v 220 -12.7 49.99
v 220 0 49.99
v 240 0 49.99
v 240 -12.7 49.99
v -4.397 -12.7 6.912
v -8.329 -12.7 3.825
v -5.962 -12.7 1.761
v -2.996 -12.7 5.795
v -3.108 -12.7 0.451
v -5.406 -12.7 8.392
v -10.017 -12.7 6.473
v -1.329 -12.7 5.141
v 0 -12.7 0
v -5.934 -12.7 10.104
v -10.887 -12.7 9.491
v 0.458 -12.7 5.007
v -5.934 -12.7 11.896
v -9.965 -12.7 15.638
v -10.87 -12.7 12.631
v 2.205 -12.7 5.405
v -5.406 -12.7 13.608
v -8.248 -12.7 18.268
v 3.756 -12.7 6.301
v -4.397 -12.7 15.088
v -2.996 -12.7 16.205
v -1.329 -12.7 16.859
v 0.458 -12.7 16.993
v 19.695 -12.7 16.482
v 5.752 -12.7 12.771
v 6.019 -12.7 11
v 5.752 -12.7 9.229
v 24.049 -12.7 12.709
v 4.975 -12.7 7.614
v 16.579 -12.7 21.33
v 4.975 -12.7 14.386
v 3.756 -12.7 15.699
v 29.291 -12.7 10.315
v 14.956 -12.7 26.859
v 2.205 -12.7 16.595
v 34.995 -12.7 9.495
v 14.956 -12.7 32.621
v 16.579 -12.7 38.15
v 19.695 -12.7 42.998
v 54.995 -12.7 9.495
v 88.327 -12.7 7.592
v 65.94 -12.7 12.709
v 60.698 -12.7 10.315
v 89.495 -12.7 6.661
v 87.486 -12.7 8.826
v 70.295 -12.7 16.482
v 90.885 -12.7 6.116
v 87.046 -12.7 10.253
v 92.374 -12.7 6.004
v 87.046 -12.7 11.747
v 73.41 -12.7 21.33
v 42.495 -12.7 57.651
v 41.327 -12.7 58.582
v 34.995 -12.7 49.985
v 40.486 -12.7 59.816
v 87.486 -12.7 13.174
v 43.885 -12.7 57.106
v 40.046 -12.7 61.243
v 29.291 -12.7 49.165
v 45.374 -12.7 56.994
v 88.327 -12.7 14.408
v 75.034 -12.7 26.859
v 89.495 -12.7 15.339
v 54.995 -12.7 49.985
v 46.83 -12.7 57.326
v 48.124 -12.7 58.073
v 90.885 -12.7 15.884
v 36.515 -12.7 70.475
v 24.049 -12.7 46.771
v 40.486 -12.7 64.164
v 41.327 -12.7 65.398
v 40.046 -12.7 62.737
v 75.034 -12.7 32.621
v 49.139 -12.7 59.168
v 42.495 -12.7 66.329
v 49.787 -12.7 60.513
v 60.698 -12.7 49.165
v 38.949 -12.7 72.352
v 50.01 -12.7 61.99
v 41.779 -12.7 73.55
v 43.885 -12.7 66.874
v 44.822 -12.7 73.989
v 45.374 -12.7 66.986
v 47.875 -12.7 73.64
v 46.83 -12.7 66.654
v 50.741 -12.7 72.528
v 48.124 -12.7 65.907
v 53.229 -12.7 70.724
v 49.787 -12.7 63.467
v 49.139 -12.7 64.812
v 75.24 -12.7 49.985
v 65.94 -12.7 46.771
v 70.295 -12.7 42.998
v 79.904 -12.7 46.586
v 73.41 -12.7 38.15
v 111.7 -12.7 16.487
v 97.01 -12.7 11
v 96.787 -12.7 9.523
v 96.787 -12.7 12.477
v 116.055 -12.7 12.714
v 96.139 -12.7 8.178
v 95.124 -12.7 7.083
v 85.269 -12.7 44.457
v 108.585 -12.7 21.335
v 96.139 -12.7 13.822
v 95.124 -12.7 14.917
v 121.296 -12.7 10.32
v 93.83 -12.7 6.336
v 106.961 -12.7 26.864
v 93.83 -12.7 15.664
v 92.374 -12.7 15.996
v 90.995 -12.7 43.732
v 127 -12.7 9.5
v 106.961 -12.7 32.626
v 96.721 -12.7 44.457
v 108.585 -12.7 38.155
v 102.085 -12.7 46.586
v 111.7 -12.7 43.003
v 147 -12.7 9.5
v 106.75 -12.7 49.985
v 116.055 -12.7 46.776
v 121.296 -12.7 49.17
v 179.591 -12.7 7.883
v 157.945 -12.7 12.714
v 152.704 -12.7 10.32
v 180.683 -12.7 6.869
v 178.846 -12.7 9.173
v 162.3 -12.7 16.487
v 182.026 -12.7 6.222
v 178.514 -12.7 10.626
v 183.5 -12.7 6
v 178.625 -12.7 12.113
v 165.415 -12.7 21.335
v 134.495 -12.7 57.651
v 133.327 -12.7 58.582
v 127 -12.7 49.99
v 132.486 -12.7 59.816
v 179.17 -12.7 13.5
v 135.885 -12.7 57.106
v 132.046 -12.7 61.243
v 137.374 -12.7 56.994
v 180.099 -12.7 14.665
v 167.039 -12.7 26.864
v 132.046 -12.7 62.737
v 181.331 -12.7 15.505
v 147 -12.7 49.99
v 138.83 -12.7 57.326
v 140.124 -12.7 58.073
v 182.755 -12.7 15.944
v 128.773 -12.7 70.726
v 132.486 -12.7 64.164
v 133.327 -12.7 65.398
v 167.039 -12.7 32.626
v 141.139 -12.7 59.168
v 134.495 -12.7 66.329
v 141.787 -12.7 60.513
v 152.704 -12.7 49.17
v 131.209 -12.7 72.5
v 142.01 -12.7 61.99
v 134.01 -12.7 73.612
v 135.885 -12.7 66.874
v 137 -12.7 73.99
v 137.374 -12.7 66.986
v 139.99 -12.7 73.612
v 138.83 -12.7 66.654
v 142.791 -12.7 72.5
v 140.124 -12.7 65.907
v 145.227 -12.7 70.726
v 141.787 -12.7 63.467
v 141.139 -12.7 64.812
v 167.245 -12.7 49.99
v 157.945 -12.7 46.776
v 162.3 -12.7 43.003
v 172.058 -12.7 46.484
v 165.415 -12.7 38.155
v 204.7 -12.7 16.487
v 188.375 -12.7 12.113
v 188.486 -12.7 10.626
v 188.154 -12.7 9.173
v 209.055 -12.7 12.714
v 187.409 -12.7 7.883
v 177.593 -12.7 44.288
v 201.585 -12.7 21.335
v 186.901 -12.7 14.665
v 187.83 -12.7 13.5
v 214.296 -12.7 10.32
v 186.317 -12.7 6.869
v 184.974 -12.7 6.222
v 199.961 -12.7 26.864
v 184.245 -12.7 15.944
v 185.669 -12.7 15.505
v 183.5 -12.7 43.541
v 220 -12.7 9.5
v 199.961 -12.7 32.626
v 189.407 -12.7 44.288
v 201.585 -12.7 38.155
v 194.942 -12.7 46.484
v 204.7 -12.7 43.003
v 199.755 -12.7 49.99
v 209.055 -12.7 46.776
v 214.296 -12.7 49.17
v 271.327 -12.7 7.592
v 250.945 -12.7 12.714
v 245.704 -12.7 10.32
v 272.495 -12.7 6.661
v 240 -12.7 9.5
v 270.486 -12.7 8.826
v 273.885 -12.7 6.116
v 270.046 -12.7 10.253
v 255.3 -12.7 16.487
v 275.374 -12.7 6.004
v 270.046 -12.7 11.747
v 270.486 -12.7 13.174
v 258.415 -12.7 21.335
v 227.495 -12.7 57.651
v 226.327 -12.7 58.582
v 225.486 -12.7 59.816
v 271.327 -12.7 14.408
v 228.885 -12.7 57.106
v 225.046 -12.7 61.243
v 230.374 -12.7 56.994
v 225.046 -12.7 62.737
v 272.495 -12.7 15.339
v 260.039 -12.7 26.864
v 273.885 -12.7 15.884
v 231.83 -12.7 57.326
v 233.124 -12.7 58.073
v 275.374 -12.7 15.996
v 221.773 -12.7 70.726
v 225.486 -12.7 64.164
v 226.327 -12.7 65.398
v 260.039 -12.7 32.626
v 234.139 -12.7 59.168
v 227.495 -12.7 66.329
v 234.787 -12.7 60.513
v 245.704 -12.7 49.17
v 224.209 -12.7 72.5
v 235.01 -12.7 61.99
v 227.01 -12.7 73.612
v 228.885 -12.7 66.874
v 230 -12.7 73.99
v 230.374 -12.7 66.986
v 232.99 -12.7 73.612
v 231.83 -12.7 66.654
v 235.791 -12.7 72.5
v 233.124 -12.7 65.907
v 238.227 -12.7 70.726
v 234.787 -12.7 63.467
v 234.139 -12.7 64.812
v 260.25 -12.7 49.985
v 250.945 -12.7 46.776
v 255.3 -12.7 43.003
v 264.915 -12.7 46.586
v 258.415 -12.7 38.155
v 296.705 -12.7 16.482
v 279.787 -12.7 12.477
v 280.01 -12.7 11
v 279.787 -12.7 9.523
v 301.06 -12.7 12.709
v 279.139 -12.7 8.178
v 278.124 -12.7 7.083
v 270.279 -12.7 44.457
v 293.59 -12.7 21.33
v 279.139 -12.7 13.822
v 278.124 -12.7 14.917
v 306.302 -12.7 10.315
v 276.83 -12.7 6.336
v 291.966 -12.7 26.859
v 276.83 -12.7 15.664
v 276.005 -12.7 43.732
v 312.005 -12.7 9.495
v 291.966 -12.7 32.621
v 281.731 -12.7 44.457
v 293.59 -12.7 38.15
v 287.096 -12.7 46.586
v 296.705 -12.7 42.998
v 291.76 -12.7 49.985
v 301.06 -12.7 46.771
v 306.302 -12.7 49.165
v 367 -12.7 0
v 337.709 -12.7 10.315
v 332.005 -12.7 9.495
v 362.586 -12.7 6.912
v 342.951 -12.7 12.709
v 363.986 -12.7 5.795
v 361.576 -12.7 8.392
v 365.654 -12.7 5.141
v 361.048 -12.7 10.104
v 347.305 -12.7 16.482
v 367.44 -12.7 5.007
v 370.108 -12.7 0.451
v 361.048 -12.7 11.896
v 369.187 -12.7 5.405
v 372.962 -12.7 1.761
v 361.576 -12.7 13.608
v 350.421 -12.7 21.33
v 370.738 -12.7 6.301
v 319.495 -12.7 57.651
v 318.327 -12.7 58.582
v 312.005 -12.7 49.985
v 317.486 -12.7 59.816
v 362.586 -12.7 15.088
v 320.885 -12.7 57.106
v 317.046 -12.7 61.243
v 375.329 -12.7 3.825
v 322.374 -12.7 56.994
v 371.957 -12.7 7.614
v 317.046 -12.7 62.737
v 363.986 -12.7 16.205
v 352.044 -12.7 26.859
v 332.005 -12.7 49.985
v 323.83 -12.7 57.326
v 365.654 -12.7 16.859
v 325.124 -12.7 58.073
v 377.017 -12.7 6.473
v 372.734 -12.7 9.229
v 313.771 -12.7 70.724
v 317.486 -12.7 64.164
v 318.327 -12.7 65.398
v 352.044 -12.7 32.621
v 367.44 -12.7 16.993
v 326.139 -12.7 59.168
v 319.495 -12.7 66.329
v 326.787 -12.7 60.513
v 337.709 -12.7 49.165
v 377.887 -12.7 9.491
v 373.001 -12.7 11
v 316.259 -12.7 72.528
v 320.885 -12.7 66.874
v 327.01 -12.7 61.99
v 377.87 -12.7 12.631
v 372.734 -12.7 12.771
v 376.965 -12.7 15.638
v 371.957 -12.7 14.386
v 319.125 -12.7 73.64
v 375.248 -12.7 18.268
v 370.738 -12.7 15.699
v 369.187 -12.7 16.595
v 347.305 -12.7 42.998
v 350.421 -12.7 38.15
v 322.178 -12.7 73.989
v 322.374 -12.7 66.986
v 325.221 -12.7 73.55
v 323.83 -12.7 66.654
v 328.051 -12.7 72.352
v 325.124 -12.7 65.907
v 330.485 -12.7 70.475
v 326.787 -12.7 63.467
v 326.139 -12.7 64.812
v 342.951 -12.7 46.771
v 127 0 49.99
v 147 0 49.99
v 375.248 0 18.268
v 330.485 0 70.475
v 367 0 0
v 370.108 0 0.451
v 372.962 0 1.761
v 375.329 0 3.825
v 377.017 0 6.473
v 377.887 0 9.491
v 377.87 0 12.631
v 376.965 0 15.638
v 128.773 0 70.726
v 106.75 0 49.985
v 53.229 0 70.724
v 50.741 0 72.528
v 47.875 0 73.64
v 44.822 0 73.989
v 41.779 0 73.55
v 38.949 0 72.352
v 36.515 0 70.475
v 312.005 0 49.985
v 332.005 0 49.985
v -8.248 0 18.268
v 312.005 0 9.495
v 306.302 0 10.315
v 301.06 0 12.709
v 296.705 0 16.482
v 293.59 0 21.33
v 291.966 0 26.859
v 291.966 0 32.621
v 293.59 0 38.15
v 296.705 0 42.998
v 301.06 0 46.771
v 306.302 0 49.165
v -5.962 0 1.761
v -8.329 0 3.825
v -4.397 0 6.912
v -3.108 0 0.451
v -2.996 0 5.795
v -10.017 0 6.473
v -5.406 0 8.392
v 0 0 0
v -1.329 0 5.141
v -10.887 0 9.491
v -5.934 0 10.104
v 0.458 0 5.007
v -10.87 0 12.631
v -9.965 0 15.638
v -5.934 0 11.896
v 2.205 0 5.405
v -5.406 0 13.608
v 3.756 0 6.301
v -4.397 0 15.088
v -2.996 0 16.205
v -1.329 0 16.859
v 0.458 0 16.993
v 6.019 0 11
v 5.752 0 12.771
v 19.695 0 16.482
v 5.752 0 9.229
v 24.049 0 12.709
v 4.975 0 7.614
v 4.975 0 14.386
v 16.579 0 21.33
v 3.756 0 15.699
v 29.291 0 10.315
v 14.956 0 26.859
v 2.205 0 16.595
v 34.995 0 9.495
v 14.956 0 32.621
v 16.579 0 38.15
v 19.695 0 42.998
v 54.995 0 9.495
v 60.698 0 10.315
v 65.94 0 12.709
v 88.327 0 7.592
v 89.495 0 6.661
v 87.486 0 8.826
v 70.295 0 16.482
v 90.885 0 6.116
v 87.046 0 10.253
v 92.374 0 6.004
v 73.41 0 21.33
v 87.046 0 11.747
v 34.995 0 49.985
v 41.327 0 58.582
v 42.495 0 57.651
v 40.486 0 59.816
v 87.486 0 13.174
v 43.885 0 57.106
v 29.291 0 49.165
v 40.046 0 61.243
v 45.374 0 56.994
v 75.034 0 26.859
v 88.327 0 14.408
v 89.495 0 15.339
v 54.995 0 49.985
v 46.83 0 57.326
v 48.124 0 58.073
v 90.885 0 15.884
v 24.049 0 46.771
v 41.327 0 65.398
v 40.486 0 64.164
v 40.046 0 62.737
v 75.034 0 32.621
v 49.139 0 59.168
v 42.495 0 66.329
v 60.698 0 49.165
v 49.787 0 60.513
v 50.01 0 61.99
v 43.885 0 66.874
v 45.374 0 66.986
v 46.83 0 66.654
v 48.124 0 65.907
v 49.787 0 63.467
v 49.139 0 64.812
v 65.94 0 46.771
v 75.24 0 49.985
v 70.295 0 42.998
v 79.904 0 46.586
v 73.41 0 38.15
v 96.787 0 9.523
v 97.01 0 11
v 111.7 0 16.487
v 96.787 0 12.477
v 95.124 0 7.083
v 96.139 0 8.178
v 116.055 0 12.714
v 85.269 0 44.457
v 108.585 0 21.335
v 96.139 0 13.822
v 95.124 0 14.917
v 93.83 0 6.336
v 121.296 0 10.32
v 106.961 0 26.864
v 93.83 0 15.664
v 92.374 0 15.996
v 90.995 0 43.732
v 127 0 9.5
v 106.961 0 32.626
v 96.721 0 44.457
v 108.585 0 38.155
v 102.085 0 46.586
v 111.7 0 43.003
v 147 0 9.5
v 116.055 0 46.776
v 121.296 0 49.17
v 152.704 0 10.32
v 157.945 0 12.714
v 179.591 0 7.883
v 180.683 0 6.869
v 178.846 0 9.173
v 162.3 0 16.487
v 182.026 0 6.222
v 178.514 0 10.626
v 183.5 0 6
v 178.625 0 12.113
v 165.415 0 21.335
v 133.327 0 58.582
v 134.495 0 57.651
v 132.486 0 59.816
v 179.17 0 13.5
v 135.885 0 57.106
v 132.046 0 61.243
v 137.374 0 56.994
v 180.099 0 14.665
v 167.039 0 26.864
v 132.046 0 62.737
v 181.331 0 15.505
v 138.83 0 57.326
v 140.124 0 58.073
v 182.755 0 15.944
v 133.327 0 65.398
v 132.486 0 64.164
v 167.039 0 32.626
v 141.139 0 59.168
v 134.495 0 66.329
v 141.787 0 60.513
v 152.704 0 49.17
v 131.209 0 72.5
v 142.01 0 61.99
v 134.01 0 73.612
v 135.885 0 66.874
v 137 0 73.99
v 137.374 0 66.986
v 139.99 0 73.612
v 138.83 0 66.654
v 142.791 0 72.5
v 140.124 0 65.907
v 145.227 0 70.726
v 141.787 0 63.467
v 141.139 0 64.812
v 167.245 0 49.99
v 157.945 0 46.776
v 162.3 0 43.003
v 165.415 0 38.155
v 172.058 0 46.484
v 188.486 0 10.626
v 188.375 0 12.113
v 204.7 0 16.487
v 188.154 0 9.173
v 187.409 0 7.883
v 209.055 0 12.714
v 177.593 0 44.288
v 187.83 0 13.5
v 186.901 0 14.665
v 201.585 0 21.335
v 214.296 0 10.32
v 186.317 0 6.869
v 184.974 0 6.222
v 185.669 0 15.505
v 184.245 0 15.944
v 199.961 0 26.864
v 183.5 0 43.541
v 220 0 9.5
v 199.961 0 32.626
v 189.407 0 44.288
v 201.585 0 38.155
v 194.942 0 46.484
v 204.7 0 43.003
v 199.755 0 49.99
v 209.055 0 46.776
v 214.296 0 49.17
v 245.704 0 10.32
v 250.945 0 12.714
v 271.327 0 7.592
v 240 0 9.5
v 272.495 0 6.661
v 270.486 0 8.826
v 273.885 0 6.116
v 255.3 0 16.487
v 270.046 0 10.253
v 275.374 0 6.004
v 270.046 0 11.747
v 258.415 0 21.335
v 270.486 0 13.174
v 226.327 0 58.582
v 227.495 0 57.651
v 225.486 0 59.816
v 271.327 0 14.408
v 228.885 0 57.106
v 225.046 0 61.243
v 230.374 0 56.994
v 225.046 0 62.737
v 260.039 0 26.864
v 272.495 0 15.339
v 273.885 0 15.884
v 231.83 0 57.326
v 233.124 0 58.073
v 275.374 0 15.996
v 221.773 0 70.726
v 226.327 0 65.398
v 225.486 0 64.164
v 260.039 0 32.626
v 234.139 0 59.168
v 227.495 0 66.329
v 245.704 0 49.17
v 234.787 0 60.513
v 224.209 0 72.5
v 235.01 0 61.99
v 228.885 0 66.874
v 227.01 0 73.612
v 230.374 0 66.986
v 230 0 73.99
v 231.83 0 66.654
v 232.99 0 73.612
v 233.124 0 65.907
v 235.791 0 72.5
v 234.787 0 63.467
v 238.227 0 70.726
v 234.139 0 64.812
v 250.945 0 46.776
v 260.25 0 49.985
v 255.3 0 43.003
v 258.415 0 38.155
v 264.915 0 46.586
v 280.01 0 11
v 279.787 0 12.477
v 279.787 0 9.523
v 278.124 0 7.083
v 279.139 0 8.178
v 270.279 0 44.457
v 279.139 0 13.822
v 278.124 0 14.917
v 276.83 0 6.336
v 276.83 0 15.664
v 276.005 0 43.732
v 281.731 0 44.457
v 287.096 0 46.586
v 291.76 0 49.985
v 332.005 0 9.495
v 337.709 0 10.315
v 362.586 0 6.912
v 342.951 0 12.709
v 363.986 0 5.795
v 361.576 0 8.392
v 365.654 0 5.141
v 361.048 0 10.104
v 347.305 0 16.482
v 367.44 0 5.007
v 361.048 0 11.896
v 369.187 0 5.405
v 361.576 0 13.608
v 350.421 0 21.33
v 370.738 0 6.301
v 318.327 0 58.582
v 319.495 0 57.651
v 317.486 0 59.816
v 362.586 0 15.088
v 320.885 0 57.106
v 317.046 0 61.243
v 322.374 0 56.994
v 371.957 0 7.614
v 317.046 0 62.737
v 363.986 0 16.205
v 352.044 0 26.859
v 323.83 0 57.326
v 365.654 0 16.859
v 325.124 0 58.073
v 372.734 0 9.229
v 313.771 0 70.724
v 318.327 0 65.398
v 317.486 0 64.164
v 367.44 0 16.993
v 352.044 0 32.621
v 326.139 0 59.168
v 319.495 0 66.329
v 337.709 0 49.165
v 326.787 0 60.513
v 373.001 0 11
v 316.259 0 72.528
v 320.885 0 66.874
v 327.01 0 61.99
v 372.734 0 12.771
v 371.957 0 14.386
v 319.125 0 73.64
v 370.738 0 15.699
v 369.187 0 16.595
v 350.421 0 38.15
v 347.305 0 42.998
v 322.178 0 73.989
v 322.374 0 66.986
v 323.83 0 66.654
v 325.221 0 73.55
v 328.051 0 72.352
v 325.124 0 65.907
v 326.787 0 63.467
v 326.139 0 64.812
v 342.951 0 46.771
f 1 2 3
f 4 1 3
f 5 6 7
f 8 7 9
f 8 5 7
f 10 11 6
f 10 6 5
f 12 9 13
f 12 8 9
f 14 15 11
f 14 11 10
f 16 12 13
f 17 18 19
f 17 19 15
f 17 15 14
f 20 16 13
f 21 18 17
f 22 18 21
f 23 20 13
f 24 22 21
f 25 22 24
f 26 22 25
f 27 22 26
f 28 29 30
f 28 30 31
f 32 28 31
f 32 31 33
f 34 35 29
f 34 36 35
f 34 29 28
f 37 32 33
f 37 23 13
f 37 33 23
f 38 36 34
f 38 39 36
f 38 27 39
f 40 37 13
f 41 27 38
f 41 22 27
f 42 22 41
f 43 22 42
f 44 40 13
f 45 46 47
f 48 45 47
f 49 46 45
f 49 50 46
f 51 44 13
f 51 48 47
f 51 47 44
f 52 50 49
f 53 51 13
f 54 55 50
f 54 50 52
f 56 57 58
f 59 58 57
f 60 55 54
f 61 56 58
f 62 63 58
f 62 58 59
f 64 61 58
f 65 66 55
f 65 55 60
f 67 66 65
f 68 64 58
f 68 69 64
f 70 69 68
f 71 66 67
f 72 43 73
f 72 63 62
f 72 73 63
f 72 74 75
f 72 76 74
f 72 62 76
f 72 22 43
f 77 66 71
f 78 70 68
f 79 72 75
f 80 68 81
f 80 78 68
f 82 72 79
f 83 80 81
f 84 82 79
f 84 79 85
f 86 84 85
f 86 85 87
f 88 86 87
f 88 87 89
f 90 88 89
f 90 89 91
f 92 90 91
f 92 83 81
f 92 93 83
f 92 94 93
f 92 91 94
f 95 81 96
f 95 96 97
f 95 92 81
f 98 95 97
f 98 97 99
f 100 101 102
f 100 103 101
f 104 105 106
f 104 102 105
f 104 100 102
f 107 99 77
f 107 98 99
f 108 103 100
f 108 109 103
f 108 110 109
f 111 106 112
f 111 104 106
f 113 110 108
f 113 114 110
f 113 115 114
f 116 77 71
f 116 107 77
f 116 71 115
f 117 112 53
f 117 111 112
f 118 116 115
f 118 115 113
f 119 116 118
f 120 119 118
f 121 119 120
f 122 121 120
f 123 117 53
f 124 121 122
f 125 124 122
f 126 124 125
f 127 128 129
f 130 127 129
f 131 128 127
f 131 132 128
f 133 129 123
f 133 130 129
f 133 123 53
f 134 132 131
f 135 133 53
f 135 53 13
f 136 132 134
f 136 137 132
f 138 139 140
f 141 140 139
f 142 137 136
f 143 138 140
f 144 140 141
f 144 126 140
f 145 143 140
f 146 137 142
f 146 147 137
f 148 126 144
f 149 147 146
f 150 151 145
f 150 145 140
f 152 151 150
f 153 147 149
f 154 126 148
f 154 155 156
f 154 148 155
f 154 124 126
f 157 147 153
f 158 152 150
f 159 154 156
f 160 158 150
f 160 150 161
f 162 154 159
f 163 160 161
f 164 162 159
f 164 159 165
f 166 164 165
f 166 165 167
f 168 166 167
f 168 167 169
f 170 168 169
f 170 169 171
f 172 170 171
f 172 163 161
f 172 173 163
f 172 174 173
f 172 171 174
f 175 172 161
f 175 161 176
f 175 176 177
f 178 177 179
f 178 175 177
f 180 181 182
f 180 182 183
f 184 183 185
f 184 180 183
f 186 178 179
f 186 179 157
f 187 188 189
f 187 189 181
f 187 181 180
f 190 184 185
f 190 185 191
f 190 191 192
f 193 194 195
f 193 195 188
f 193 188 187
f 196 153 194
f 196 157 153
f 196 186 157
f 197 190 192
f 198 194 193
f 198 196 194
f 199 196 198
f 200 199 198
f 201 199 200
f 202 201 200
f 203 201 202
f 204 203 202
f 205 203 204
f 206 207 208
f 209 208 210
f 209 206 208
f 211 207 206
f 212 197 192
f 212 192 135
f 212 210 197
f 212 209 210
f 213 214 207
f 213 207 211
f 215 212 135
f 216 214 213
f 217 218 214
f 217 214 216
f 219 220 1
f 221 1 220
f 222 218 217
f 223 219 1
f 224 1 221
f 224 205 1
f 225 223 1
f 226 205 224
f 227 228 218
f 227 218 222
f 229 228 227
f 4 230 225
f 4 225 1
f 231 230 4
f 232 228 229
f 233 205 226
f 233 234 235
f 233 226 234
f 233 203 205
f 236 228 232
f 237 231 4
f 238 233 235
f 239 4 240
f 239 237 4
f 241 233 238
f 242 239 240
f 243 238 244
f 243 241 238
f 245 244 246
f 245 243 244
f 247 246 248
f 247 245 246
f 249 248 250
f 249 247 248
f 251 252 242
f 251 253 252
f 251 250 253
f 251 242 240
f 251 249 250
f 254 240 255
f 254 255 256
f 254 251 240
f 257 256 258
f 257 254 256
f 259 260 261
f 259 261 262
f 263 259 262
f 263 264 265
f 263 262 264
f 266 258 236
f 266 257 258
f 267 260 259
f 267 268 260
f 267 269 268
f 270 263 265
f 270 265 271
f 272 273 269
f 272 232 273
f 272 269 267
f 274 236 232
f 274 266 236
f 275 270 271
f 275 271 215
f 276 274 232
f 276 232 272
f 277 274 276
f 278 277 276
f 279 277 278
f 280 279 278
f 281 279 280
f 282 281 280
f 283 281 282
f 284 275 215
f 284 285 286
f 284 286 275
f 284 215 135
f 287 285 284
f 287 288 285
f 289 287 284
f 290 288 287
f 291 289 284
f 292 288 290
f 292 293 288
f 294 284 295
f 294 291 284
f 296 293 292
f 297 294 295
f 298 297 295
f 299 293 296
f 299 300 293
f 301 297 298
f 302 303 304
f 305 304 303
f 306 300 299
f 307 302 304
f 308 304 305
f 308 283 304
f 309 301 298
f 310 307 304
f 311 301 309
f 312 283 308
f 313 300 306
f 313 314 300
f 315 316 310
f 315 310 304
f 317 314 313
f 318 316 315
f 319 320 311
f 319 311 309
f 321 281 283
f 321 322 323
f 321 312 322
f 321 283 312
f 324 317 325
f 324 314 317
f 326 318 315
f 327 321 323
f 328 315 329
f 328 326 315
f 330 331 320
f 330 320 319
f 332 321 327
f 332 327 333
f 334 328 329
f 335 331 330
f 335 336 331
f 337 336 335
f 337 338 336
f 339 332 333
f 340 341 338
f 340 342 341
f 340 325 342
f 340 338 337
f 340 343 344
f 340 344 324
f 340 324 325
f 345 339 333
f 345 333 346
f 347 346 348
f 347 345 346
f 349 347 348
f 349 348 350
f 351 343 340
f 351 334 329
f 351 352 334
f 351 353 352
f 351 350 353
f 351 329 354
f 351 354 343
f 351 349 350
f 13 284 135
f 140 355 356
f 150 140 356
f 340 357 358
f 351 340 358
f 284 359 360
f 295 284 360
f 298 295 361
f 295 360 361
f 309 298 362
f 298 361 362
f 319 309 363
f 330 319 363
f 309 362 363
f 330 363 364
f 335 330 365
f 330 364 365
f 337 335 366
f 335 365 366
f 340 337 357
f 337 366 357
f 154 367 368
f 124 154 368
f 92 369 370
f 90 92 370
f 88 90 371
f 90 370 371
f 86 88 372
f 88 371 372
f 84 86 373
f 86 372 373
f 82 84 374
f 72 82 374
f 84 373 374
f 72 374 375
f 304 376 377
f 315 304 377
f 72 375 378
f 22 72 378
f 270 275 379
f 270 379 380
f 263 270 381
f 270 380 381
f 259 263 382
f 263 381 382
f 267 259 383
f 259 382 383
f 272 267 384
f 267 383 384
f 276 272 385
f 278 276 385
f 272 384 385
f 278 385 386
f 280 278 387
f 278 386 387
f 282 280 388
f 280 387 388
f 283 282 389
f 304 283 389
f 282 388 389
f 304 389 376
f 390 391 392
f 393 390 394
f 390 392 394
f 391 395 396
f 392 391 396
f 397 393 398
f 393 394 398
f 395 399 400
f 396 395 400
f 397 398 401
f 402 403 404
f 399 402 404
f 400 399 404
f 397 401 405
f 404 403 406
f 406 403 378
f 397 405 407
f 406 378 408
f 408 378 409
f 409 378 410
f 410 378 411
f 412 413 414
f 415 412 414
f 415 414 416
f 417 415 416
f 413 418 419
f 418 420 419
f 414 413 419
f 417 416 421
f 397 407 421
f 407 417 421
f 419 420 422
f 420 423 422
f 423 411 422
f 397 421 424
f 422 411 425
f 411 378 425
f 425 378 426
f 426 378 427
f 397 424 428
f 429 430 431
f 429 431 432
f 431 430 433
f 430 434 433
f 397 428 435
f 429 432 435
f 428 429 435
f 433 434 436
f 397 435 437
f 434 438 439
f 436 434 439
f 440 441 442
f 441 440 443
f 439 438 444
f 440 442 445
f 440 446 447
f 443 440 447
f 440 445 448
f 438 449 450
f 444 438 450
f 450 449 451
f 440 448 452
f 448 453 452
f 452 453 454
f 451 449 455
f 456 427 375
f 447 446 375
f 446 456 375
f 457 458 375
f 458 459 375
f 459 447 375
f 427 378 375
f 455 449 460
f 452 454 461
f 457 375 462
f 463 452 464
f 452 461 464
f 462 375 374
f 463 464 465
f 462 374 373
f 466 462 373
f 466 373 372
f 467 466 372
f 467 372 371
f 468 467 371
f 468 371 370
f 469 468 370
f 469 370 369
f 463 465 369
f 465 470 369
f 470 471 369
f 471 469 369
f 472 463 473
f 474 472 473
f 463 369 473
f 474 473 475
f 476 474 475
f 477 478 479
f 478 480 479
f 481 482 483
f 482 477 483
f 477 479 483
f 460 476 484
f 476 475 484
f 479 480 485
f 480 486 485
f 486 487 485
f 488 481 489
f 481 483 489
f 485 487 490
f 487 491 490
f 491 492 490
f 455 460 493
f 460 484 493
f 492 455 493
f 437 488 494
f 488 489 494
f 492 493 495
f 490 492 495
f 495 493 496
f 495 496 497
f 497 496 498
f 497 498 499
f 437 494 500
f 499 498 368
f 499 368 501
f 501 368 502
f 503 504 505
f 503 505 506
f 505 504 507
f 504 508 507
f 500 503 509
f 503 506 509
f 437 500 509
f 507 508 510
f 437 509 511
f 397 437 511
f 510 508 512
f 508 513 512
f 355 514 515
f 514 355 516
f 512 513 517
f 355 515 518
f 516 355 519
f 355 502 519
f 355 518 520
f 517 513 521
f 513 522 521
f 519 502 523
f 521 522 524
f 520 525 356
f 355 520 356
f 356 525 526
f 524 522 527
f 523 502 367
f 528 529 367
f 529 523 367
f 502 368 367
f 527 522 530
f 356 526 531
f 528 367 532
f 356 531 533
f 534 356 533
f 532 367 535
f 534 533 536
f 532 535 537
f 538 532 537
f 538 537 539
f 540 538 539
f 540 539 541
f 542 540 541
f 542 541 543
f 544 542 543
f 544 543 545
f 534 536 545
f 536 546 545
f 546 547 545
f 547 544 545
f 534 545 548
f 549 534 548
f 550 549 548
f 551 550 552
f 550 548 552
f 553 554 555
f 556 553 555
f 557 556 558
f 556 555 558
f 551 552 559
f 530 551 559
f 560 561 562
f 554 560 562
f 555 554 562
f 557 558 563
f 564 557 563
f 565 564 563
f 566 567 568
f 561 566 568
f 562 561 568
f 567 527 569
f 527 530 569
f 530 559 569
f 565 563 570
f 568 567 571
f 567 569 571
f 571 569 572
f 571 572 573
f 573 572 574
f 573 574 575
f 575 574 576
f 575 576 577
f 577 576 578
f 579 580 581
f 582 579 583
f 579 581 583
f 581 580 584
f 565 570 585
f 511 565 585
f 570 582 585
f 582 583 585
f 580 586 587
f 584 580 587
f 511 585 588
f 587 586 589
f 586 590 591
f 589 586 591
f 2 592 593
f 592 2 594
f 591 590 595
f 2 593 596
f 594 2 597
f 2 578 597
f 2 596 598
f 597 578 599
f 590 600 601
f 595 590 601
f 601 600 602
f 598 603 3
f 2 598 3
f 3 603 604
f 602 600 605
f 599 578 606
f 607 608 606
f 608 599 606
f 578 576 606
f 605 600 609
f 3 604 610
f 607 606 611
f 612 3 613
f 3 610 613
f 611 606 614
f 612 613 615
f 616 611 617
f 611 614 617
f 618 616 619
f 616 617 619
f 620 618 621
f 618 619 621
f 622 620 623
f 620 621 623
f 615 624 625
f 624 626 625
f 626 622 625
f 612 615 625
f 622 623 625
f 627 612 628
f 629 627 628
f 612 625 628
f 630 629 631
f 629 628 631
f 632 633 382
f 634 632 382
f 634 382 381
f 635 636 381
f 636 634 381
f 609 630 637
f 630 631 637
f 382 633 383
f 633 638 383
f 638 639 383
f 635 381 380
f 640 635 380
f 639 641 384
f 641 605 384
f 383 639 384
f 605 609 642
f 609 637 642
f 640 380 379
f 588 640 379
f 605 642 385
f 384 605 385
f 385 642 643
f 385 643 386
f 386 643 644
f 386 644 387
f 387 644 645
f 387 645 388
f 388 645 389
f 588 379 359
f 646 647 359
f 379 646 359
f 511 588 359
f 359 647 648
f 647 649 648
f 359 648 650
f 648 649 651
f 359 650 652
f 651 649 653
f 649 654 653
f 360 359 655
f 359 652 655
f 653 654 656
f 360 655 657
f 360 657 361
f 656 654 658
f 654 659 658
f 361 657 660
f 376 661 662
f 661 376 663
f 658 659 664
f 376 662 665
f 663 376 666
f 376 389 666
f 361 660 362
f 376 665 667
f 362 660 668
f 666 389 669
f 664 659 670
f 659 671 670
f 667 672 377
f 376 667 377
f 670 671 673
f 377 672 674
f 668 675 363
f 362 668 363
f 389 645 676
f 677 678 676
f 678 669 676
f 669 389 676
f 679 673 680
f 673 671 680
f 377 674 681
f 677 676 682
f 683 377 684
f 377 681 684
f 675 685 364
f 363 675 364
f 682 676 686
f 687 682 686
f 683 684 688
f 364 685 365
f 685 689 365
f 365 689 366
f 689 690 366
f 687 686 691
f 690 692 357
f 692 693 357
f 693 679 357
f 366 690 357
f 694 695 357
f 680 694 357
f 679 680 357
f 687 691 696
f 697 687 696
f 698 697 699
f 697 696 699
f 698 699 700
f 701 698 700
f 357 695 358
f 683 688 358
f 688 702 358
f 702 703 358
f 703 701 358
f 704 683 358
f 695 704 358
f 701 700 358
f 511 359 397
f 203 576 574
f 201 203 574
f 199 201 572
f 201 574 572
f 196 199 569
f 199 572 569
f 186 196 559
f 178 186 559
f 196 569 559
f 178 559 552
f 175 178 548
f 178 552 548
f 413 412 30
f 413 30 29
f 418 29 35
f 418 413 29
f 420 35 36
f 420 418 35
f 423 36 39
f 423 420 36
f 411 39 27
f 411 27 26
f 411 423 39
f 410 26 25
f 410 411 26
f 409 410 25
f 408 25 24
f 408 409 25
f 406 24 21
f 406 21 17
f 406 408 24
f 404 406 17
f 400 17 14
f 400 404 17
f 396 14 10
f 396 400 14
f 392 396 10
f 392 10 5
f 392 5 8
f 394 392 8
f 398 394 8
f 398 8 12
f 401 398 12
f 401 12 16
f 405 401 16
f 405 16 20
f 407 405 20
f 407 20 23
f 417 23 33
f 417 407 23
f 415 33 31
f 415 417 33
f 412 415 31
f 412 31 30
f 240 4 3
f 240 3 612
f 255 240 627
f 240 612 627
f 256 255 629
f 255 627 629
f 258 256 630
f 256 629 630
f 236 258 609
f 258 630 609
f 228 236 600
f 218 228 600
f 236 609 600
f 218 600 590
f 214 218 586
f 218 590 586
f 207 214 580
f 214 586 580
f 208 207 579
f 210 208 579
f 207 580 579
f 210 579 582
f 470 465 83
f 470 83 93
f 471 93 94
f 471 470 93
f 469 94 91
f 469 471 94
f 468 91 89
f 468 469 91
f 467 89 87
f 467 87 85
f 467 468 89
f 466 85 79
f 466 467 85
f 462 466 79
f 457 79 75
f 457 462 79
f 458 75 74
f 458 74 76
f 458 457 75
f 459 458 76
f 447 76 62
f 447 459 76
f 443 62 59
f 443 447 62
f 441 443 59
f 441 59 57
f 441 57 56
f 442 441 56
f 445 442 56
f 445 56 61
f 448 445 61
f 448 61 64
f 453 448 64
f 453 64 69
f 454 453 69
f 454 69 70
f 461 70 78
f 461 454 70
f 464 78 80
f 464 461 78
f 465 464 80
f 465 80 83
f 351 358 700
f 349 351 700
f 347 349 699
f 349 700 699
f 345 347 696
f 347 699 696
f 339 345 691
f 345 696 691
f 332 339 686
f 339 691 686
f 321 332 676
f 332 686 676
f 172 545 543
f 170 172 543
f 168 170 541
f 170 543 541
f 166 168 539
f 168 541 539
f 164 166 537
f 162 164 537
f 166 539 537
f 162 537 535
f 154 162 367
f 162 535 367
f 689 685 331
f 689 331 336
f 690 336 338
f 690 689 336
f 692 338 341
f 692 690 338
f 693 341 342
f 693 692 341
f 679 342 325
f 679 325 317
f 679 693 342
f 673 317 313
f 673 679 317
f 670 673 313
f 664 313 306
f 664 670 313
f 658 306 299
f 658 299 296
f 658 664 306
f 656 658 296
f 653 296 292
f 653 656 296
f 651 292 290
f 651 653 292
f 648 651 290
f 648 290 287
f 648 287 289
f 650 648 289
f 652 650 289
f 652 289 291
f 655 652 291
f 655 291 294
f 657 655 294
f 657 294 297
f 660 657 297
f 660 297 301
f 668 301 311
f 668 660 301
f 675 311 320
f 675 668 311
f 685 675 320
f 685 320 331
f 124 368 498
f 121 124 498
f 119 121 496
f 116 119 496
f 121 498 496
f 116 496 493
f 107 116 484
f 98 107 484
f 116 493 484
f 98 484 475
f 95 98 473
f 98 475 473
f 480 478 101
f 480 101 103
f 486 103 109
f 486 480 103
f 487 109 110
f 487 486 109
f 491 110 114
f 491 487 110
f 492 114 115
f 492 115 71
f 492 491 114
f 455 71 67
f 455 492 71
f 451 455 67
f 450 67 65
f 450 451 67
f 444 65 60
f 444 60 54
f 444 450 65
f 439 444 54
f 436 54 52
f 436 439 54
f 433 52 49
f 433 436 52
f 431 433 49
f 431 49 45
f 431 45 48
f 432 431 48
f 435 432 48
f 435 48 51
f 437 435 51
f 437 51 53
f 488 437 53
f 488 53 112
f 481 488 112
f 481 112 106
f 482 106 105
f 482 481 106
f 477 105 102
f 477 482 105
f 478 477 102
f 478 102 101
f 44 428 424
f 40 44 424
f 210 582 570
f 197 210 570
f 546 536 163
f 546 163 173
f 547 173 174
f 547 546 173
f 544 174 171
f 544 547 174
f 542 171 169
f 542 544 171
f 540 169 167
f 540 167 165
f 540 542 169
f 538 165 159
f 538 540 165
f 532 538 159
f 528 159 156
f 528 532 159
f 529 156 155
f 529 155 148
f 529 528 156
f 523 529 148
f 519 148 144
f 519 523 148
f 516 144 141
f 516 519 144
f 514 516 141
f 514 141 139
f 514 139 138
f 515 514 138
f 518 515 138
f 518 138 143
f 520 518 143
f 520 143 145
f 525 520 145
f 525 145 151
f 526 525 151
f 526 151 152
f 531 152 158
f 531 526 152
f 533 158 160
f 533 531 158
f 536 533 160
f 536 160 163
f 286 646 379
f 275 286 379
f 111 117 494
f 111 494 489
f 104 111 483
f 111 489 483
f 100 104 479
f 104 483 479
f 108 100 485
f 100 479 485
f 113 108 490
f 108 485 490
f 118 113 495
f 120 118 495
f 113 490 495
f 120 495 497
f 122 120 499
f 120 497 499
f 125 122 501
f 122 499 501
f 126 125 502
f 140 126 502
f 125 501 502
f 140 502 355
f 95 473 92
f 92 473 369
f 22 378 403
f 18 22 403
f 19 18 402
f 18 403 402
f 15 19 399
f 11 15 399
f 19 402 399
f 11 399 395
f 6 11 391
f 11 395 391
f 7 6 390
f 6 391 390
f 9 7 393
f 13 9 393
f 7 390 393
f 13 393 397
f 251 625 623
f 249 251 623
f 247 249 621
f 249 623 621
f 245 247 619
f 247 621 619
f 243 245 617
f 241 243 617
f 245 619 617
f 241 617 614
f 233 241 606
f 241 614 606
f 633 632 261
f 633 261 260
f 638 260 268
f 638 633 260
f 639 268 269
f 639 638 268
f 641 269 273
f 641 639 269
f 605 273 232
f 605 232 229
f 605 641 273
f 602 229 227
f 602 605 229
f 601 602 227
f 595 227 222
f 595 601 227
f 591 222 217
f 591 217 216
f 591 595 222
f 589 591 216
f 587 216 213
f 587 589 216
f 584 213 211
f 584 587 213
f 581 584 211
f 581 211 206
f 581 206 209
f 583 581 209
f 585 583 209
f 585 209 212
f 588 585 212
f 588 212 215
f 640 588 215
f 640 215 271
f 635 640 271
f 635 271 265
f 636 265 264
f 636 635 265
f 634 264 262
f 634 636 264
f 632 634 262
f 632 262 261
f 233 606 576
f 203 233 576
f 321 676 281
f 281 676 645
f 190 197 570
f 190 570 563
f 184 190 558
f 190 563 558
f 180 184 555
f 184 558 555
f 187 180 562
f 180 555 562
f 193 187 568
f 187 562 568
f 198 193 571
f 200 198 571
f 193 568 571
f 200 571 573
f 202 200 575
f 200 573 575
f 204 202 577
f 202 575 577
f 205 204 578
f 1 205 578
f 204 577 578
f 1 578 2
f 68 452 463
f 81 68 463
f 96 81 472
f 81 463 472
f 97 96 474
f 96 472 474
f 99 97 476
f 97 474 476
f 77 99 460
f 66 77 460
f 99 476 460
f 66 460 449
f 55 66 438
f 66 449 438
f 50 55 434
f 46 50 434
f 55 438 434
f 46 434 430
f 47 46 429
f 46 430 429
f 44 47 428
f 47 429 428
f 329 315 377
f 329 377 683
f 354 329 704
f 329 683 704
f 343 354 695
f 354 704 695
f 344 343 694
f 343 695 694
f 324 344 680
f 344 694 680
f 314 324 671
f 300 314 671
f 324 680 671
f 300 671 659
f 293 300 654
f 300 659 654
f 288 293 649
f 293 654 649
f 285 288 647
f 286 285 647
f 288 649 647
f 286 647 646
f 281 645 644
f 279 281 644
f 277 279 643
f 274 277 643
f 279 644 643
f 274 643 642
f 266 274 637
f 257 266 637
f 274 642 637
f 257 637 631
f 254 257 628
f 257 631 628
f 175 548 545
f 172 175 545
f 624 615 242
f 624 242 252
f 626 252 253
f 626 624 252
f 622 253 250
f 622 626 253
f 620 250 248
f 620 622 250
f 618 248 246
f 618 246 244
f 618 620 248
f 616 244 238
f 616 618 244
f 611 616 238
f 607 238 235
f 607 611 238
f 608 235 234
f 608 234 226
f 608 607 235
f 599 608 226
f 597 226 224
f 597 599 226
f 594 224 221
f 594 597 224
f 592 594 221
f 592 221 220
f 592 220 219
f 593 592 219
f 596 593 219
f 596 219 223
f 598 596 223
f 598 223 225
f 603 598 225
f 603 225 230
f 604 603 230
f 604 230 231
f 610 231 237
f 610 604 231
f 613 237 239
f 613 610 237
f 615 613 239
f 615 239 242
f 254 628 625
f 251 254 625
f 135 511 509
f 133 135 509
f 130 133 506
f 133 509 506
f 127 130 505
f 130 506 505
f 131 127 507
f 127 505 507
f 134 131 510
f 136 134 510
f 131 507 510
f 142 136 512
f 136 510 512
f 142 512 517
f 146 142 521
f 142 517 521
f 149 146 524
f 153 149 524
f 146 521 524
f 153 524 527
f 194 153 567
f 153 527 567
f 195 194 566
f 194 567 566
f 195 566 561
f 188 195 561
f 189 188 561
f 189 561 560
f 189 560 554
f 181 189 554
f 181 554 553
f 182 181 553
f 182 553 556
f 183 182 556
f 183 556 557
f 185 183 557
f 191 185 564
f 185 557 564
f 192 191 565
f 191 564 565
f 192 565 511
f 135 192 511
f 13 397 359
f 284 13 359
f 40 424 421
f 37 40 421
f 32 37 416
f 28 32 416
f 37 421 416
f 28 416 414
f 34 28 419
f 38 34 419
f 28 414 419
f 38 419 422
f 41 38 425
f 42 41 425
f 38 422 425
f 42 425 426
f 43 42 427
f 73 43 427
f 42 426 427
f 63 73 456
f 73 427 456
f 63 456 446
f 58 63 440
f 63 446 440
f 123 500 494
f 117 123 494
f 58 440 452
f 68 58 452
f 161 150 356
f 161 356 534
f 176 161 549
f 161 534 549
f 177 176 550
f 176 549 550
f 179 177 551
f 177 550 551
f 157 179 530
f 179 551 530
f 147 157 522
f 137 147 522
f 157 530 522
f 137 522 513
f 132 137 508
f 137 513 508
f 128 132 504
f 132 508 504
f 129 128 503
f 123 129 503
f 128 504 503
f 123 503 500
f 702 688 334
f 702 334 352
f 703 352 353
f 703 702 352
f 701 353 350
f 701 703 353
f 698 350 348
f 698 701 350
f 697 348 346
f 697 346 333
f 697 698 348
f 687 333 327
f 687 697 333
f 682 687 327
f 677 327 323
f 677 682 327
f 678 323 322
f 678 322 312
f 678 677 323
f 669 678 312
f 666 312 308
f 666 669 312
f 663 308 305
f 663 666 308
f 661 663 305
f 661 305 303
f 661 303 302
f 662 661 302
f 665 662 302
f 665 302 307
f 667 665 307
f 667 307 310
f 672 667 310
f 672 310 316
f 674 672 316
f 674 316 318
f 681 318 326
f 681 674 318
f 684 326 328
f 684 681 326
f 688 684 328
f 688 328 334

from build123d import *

# Parameters (mm, degrees)
F0_R     = 6.01
F0_R_2   = 5.01
F1_DEPTH = 12.7


with BuildPart() as f1:
    # F0 (on Front) → F1 (new body)
    with BuildSketch(Plane.XZ):
        with BuildLine():
            Line((183.5, 0), (367, 0))
            ThreePointArc((367, 0), (377.016632, 6.473352), (375.248216, 18.267838))
            Line((375.248216, 18.267838), (330.485281, 70.475281))
            ThreePointArc((330.485281, 70.475281), (322.178418, 73.988674), (313.770763, 70.723823))
            Line((313.770763, 70.723823), (291.760312, 49.984999))
            ThreePointArc((291.760312, 49.984999), (276.005306, 43.731851), (260.2503, 49.984999))
            Line((260.2503, 49.984999), (238.227135, 70.725803))
            ThreePointArc((238.227135, 70.725803), (230, 73.99), (221.772865, 70.725803))
            Line((221.772865, 70.725803), (199.755006, 49.99))
            ThreePointArc((199.755006, 49.99), (183.5, 43.540666), (167.244994, 49.99))
            Line((167.244994, 49.99), (145.227135, 70.725803))
            ThreePointArc((145.227135, 70.725803), (137, 73.99), (128.772865, 70.725803))
            Line((128.772865, 70.725803), (106.7497, 49.984999))
            ThreePointArc((106.7497, 49.984999), (90.994694, 43.731851), (75.239688, 49.984999))
            Line((75.239688, 49.984999), (53.229237, 70.723823))
            ThreePointArc((53.229237, 70.723823), (44.821582, 73.988674), (36.514719, 70.475281))
            Line((36.514719, 70.475281), (-8.248216, 18.267838))
            ThreePointArc((-8.248216, 18.267838), (-10.016632, 6.473352), (0, 0))
            Line((0, 0), (183.5, 0))
        make_face()
        with Locations((0.00881, 10.999996)):
            Circle(F0_R, mode=Mode.SUBTRACT)
        with Locations((92, 11)):
            Circle(F0_R_2, mode=Mode.SUBTRACT)
        with BuildLine():
            ThreePointArc((183.5, 16), (188.5, 11), (183.5, 6))
            ThreePointArc((183.5, 6), (178.5, 11), (183.5, 16))
        make_face(mode=Mode.SUBTRACT)
        with BuildLine():
            Line((34.994694, 49.984999), (54.994694, 49.984999))
            ThreePointArc((54.994694, 49.984999), (75.239694, 29.739999), (54.994694, 9.494999))
            Line((54.994694, 9.494999), (34.994694, 9.494999))
            ThreePointArc((34.994694, 9.494999), (14.749694, 29.739999), (34.994694, 49.984999))
        make_face(mode=Mode.SUBTRACT)
        with BuildLine():
            ThreePointArc((147, 49.99), (167.245, 29.745), (147, 9.5))
            Line((147, 9.5), (127, 9.5))
            ThreePointArc((127, 9.5), (106.755, 29.745), (127, 49.99))
            Line((127, 49.99), (147, 49.99))
        make_face(mode=Mode.SUBTRACT)
        with Locations((275, 11)):
            Circle(F0_R_2, mode=Mode.SUBTRACT)
        with Locations((366.99119, 10.999996)):
            Circle(F0_R, mode=Mode.SUBTRACT)
        with BuildLine():
            Line((240, 9.5), (220, 9.5))
            ThreePointArc((220, 9.5), (199.755, 29.745), (220, 49.99))
            Line((220, 49.99), (240, 49.99))
            ThreePointArc((240, 49.99), (260.245, 29.745), (240, 9.5))
        make_face(mode=Mode.SUBTRACT)
        with BuildLine():
            ThreePointArc((332.005306, 49.984999), (352.250306, 29.739999), (332.005306, 9.494999))
            Line((332.005306, 9.494999), (312.005306, 9.494999))
            ThreePointArc((312.005306, 9.494999), (291.760306, 29.739999), (312.005306, 49.984999))
            Line((312.005306, 49.984999), (332.005306, 49.984999))
        make_face(mode=Mode.SUBTRACT)
        with Locations((45, 61.99)):
            Circle(F0_R_2, mode=Mode.SUBTRACT)
        with Locations((137, 61.99)):
            Circle(F0_R_2, mode=Mode.SUBTRACT)
        with Locations((230, 61.99)):
            Circle(F0_R_2, mode=Mode.SUBTRACT)
        with Locations((322, 61.99)):
            Circle(F0_R_2, mode=Mode.SUBTRACT)
    extrude(amount=F1_DEPTH)


solid = f1.part
